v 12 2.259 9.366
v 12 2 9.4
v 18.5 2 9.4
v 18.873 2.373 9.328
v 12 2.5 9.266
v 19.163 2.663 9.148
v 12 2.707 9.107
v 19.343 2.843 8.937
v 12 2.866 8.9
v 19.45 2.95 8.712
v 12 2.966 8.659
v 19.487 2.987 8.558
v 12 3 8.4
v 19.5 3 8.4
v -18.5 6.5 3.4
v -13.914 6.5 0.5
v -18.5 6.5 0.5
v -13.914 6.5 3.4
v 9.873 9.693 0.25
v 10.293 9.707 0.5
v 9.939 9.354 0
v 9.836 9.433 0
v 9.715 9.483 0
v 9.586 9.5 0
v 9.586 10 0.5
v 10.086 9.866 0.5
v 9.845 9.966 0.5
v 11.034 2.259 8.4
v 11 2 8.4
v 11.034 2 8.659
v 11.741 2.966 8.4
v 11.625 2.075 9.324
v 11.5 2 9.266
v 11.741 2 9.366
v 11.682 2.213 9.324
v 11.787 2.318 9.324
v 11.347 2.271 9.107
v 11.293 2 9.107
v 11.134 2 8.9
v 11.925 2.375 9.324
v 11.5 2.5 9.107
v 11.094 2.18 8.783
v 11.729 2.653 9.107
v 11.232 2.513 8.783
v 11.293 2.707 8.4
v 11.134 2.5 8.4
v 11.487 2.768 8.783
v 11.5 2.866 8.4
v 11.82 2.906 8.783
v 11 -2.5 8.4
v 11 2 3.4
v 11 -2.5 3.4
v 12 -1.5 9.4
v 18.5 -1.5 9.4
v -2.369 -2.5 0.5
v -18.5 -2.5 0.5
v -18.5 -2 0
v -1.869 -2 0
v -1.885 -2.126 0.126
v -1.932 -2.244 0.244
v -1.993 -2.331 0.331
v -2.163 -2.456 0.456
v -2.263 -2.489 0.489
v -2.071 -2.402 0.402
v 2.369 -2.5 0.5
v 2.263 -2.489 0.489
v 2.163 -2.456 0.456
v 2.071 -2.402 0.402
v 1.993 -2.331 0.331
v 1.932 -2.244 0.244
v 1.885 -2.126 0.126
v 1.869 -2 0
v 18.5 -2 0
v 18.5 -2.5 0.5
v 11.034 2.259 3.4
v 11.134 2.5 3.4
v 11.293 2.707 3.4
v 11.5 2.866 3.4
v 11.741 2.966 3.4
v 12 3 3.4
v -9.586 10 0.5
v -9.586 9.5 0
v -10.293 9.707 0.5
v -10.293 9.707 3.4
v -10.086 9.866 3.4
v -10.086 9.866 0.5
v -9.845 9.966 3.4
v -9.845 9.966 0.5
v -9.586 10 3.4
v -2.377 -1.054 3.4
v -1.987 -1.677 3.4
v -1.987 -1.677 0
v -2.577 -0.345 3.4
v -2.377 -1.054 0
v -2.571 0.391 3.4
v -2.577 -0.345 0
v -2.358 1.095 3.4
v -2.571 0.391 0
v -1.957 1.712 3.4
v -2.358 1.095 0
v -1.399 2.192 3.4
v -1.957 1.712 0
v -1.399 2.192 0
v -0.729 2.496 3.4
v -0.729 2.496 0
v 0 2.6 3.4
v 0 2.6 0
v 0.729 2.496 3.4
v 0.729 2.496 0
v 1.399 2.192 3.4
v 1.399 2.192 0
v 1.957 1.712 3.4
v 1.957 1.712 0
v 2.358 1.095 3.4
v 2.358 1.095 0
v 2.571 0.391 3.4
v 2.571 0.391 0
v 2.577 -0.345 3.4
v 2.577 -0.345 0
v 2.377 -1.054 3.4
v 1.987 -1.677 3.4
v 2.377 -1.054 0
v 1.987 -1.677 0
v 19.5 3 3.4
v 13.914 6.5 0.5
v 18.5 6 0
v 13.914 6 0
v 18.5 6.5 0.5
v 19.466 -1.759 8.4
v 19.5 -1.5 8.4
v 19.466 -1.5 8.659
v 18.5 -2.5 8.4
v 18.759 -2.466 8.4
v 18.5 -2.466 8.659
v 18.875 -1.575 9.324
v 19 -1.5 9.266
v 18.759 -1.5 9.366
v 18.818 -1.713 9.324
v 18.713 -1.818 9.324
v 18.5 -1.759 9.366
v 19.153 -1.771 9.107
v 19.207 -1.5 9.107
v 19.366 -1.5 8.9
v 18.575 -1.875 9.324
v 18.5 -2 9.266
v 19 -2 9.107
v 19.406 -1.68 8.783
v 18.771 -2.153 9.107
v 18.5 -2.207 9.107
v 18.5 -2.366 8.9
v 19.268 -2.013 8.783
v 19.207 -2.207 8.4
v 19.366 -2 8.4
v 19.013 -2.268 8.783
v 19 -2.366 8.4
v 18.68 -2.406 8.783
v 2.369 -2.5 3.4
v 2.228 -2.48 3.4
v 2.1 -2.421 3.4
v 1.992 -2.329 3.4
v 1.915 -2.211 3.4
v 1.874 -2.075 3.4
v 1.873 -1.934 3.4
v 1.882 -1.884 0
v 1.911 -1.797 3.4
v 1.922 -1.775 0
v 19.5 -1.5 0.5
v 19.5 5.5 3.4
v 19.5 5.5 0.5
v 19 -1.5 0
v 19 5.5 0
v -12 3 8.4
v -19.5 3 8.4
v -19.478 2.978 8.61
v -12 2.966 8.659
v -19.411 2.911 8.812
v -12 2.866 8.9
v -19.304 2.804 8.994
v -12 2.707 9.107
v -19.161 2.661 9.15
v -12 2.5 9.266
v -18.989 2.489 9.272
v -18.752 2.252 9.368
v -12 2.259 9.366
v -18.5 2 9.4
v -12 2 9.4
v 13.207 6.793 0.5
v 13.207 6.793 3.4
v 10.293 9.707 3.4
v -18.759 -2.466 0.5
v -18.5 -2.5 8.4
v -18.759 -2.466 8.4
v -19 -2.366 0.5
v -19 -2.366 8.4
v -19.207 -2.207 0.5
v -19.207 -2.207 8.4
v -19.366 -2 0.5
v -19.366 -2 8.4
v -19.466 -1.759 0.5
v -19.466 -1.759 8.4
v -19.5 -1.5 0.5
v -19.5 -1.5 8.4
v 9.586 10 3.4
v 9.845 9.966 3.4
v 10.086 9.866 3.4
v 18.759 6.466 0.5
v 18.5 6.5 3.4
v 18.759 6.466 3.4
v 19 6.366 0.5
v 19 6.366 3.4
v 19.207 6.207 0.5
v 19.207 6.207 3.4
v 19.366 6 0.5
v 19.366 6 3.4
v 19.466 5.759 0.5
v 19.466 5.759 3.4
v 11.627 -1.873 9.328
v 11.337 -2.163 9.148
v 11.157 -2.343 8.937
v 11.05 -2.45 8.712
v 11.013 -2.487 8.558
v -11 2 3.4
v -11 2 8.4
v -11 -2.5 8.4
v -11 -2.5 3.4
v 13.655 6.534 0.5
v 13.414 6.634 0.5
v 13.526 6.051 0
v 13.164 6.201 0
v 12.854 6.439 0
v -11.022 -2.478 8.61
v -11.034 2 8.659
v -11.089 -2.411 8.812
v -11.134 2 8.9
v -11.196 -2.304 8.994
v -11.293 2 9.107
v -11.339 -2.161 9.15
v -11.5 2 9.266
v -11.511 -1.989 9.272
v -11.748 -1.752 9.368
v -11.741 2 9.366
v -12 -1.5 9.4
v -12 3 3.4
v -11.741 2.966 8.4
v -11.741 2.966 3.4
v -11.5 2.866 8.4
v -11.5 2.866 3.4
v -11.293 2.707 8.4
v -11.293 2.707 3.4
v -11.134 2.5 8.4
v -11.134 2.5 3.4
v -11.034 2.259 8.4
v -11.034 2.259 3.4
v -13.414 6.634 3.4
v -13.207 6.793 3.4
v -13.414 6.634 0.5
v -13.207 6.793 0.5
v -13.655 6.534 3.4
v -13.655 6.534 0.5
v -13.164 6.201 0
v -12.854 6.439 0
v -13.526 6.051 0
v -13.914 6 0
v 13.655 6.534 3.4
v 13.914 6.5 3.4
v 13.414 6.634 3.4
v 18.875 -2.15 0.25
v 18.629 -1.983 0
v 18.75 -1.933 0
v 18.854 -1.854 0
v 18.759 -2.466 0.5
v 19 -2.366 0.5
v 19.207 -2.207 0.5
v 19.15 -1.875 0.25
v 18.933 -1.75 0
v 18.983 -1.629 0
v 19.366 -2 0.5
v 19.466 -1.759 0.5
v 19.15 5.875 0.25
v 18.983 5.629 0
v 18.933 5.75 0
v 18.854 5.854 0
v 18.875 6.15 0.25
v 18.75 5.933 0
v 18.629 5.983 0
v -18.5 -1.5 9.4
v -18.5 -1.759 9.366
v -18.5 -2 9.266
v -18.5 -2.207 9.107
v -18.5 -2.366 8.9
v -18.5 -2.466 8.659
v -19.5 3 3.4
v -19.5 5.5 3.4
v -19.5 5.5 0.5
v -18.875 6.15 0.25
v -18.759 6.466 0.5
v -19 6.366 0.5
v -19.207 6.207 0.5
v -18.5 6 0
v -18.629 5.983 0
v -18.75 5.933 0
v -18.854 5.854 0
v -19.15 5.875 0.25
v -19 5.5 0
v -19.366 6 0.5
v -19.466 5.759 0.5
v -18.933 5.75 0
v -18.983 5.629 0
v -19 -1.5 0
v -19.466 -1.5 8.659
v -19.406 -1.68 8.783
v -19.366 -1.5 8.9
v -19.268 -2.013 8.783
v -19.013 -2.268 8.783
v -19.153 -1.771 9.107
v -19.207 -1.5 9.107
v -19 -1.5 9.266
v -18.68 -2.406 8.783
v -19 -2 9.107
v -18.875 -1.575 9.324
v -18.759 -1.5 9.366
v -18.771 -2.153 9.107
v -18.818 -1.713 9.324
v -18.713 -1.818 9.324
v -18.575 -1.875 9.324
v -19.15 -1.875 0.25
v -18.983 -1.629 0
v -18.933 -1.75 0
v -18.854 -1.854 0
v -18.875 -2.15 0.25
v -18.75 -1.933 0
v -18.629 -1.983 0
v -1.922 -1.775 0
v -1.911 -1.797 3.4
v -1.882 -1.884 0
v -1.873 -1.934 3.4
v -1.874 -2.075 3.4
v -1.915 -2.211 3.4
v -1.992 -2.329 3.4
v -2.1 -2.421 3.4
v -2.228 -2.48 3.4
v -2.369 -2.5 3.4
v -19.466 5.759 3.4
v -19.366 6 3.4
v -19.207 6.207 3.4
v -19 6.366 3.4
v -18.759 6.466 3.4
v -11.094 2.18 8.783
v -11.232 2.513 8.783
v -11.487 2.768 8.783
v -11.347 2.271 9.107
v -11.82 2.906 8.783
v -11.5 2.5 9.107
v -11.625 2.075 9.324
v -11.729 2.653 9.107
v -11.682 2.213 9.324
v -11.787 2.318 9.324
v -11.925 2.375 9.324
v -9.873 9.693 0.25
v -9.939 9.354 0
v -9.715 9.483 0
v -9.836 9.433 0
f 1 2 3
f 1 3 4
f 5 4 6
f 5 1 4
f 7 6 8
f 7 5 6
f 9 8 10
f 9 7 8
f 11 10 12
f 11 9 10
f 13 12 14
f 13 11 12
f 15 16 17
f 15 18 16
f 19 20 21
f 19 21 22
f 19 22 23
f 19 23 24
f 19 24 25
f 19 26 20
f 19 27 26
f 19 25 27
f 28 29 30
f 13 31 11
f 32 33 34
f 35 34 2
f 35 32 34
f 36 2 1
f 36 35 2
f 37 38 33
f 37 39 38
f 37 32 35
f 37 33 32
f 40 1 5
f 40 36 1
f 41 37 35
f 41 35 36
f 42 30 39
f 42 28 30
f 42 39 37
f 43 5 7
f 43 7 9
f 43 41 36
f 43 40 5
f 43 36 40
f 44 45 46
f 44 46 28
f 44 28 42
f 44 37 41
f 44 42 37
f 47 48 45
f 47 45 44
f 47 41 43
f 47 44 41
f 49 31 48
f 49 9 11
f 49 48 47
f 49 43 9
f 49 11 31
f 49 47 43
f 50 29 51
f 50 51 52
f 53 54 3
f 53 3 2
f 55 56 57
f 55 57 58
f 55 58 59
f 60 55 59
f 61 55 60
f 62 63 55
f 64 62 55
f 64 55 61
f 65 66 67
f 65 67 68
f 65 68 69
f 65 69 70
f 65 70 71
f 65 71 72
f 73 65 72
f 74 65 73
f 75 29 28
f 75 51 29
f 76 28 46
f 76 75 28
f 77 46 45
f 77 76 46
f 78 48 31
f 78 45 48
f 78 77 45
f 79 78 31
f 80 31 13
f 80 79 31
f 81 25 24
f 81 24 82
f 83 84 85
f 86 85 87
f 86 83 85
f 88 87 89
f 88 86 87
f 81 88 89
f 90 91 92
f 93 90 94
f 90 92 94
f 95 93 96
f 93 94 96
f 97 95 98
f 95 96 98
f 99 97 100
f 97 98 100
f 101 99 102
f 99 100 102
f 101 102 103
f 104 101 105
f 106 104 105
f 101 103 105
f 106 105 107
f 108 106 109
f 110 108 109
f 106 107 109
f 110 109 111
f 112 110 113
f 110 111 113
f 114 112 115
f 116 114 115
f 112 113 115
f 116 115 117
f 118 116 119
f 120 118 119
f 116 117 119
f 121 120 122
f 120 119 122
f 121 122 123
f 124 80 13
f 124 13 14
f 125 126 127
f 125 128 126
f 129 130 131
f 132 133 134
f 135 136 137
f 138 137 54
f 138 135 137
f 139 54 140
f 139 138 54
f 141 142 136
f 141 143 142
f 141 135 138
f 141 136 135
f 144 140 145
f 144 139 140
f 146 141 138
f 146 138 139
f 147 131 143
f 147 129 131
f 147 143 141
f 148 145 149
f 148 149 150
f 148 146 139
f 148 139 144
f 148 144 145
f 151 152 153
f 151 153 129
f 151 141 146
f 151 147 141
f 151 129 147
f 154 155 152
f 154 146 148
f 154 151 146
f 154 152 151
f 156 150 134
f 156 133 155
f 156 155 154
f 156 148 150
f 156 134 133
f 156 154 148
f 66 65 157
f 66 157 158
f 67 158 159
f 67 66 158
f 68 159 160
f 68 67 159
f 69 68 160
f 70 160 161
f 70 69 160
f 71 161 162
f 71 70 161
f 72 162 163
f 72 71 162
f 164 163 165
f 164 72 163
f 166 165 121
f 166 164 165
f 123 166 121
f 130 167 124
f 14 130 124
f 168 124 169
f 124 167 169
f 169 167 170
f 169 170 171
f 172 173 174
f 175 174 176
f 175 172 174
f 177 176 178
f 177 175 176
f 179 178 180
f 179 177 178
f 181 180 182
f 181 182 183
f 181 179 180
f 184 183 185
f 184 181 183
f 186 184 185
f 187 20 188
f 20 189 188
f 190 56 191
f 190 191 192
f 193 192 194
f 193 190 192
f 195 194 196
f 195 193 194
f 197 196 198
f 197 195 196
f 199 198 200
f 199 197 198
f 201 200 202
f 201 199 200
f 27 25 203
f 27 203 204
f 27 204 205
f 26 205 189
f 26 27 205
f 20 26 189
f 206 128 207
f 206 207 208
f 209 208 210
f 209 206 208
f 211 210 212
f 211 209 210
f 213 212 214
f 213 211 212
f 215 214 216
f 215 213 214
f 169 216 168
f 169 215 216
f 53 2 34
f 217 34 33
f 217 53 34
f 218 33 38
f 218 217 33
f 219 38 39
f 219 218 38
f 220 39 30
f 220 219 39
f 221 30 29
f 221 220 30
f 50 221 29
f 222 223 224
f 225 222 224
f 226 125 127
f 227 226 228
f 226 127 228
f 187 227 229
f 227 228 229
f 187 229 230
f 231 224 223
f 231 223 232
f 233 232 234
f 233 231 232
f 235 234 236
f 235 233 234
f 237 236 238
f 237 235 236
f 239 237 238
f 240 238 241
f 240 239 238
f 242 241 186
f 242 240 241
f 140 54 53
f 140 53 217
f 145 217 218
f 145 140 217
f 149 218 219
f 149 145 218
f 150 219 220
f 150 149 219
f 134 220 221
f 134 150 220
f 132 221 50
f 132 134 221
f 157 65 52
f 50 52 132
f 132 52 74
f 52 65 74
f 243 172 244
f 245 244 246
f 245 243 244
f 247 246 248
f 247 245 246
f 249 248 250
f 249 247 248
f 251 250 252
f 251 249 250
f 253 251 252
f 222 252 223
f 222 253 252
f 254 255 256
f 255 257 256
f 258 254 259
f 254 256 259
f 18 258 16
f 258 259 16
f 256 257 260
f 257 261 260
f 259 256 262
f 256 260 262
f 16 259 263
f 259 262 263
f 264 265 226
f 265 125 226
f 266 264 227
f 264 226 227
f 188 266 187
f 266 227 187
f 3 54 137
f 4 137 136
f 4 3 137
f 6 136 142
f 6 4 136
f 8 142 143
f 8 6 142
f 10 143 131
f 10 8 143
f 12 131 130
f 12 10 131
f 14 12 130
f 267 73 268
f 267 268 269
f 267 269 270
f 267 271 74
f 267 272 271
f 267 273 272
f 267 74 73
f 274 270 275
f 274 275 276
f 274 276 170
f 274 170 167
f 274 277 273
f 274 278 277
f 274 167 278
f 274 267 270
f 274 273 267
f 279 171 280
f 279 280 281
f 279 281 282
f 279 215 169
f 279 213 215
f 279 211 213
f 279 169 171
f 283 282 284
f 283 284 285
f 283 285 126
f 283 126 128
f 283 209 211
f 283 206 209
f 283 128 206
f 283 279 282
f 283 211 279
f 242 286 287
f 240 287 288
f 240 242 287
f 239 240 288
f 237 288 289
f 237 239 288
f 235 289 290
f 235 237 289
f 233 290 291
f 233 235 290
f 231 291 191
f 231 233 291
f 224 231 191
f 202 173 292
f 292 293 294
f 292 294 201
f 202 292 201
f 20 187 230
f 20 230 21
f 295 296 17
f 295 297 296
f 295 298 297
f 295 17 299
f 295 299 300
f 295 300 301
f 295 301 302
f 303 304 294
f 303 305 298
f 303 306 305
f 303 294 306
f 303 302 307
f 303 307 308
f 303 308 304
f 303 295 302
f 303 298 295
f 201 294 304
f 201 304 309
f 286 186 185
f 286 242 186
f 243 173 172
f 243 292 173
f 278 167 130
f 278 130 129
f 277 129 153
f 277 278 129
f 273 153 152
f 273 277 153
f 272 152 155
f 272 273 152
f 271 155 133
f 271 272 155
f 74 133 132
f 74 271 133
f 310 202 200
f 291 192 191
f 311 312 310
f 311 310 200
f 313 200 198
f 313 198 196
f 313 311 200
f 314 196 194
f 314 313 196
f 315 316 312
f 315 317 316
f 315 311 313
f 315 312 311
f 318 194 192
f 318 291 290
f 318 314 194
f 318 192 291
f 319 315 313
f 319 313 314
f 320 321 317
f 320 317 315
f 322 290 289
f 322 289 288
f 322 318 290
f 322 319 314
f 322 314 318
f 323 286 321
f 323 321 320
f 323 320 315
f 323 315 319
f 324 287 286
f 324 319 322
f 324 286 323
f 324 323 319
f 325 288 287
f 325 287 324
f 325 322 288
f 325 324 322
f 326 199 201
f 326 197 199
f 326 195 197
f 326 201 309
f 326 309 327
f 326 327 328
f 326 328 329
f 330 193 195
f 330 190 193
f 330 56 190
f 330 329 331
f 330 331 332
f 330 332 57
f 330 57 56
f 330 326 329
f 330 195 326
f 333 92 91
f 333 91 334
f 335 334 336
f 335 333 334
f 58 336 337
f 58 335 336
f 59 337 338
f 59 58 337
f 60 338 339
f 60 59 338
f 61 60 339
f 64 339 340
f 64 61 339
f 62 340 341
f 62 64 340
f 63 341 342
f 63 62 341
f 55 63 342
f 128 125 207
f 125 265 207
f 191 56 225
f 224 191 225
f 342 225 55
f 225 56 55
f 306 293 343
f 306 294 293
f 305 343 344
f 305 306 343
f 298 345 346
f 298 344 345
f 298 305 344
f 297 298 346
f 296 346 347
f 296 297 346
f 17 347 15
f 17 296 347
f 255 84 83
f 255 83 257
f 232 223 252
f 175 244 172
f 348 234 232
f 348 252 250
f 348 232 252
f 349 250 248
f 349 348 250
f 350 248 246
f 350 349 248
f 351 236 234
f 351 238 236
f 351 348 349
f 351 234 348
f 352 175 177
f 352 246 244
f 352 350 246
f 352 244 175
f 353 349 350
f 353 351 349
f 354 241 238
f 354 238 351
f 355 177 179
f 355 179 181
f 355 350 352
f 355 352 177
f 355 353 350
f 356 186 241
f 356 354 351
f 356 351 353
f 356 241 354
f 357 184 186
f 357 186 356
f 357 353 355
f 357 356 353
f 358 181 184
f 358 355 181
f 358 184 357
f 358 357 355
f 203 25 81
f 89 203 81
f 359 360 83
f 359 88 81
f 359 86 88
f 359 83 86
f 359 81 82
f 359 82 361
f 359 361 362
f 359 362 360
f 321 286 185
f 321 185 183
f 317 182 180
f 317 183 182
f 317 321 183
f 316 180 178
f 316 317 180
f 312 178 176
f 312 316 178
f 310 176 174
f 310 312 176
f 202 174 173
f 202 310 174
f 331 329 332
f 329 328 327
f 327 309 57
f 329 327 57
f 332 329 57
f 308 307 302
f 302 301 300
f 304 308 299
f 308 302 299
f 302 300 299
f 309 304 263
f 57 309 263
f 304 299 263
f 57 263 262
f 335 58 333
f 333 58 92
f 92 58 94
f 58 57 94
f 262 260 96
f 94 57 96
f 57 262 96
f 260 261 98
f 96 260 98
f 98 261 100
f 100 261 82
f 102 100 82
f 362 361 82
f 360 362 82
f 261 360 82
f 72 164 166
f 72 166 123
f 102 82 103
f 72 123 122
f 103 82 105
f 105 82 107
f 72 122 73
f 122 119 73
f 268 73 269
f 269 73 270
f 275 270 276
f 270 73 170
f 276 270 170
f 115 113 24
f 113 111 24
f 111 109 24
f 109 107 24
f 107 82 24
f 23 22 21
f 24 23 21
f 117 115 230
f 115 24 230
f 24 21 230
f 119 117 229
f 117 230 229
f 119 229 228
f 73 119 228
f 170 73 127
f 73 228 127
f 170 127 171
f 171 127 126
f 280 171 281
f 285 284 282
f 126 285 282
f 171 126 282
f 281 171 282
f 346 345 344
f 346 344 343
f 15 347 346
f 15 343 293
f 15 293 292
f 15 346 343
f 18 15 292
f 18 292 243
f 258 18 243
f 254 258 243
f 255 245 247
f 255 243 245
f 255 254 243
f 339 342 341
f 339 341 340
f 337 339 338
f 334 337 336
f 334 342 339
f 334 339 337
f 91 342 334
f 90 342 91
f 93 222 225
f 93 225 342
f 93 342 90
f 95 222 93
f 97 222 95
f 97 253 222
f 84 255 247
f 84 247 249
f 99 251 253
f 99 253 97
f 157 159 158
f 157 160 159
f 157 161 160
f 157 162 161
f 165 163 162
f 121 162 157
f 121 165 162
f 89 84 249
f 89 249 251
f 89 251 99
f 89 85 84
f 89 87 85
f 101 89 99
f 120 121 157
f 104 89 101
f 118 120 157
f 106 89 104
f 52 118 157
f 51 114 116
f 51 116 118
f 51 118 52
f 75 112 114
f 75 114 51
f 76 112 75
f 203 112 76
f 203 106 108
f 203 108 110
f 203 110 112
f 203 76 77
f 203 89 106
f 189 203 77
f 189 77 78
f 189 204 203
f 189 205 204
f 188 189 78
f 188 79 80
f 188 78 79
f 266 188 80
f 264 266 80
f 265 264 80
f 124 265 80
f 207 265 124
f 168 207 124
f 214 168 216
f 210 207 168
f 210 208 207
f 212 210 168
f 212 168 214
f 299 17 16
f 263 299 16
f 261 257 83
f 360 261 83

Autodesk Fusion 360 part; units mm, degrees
sketch "Sketch1" plane through (0, 0, 0) normal (0, 0, 1) x (1, 0, 0)
  line L0 (19.5, 10) -> (-19.5, 10)
  line L1 (-19.5, 10) -> (-19.5, -10)
  line L2 (-19.5, -10) -> (19.5, -10)
  line L3 (19.5, -10) -> (19.5, 10)
  line L4 (19.5, 10) -> (-19.5, -10) construction
  line L5 (-19.5, 10) -> (19.5, -10) construction
  circle A0 centre (0, 0) radius 2.6
  dimension "d1" = 5.2
  dimension "d2" = 39
  dimension "d3" = 20
extrude "Extrude1" add sketch "Sketch1" along normal blind 3.4
sketch "Sketch2" plane through (0, 0, 3.4) normal (0, 0, 1) x (-1, 0, 0)
  circle A0 centre (0, 0) radius 2.6
  line L0 (-19.5, 10) -> (-19.5, -10)
  line L1 (-19.5, -10) -> (19.5, -10)
  line L2 (19.5, -10) -> (19.5, 10)
  line L3 (19.5, 10) -> (-19.5, 10)
  line L4 (19.5, 3) -> (-19.5, 3)
  line L5 (19.5, -3) -> (-19.5, -3)
  line L6 (-19.5, 3) -> (19.5, -3) construction
  dimension "d7" = 6
extrude "Extrude2" add sketch "Sketch2" along normal blind 6 contours L0 L2 L4 L5
extrude "Extrude5" cut 1 faces at (-6.5, -10, 2.2667) along direction (0, 1, 0) up to surface (7 mm away)
sketch "Sketch3" plane through (0, 0, 9.4) normal (0, 0, 1) x (-1, 0, 0)
  line L0 (19.5, 3) -> (-19.5, 3)
  line L1 (-19.5, 3) -> (-19.5, -3)
  line L2 (-19.5, -3) -> (19.5, -3)
  line L3 (19.5, -3) -> (19.5, 3)
  line L4 (11, -3) -> (11, 3)
  line L5 (-11, -3) -> (-11, 3)
  circle A0 centre (0, 0) radius 2.6
  dimension "d11" = 11
  dimension "d12" = 11
extrude "Extrude3" cut sketch "Sketch3" against normal up to surface (6 mm away) contours L0 L2 L4 L5
extrude "Extrude4" cut 1 faces at (-16.6667, -3, 4.2667) along direction (0, 1, 0) blind 0.5
sketch "Sketch4" plane through (0, 0, 3.4) normal (0, 0, 1) x (-1, 0, 0)
  line L0 (11, 2.5) -> (0.7141, 2.5)
  arc A0 (-0.7141, 2.5) -> (0.7141, 2.5) centre (0, 0) ccw
  line L1 (-0.7141, 2.5) -> (-11, 2.5)
  line L2 (-11, 2.5) -> (-11, -3)
  line L3 (-11, -3) -> (-19.5, -3)
  line L4 (-19.5, -3) -> (-19.5, -10)
  line L5 (-19.5, -10) -> (19.5, -10)
  line L6 (19.5, -10) -> (19.5, -3)
  line L7 (19.5, -3) -> (11, -3)
  line L8 (11, -3) -> (11, 2.5)
  line L9 (10, -10) -> (13.5, -6.5)
  line L10 (13.5, -6.5) -> (19.5, -6.5)
  line L11 (-10, -10) -> (-13.5, -6.5)
  line L12 (-13.5, -6.5) -> (-19.5, -6.5)
  dimension "d24" = 20
  dimension "d25" = 3.5
  dimension "d26" = 3.5
  dimension "d27" = 135
  dimension "d28" = 135
extrude "Extrude6" cut sketch "Sketch4" against normal through all contours L5 L6 L9 L10 | L4 L5 L11 L12
fillet "Fillet2" radius 1 10 edges at (-19.5, -2.5, 4.7) (19.5, -2.5, 4.7) (11, 3, 6.4) (-11, 3, 6.4) (19.5, 6.5, 1.7) (-19.5, 6.5, 1.7) (-10, 10, 1.7) (10, 10, 1.7) (-13.5, 6.5, 1.7) (13.5, 6.5, 1.7)
fillet "Fillet1" radius 1 8 edges at (-15.25, -2.5, 9.4) (-19.5, 0.25, 9.4) (-11, 0.25, 9.4) (-15.25, 3, 9.4) (11, 0.25, 9.4) (15.25, -2.5, 9.4) (15.25, 3, 9.4) (19.5, 0.25, 9.4)
chamfer "Chamfer1" distance 0.5 angle 45 3 edges at (-19.5, 3.75, 0) (0, 10, 0) (19.5, 3.75, 0)
fillet "Fillet3" radius 0.5 2 edges at (-0.7141, -2.5, 1.95) (0.7141, -2.5, 1.95)
